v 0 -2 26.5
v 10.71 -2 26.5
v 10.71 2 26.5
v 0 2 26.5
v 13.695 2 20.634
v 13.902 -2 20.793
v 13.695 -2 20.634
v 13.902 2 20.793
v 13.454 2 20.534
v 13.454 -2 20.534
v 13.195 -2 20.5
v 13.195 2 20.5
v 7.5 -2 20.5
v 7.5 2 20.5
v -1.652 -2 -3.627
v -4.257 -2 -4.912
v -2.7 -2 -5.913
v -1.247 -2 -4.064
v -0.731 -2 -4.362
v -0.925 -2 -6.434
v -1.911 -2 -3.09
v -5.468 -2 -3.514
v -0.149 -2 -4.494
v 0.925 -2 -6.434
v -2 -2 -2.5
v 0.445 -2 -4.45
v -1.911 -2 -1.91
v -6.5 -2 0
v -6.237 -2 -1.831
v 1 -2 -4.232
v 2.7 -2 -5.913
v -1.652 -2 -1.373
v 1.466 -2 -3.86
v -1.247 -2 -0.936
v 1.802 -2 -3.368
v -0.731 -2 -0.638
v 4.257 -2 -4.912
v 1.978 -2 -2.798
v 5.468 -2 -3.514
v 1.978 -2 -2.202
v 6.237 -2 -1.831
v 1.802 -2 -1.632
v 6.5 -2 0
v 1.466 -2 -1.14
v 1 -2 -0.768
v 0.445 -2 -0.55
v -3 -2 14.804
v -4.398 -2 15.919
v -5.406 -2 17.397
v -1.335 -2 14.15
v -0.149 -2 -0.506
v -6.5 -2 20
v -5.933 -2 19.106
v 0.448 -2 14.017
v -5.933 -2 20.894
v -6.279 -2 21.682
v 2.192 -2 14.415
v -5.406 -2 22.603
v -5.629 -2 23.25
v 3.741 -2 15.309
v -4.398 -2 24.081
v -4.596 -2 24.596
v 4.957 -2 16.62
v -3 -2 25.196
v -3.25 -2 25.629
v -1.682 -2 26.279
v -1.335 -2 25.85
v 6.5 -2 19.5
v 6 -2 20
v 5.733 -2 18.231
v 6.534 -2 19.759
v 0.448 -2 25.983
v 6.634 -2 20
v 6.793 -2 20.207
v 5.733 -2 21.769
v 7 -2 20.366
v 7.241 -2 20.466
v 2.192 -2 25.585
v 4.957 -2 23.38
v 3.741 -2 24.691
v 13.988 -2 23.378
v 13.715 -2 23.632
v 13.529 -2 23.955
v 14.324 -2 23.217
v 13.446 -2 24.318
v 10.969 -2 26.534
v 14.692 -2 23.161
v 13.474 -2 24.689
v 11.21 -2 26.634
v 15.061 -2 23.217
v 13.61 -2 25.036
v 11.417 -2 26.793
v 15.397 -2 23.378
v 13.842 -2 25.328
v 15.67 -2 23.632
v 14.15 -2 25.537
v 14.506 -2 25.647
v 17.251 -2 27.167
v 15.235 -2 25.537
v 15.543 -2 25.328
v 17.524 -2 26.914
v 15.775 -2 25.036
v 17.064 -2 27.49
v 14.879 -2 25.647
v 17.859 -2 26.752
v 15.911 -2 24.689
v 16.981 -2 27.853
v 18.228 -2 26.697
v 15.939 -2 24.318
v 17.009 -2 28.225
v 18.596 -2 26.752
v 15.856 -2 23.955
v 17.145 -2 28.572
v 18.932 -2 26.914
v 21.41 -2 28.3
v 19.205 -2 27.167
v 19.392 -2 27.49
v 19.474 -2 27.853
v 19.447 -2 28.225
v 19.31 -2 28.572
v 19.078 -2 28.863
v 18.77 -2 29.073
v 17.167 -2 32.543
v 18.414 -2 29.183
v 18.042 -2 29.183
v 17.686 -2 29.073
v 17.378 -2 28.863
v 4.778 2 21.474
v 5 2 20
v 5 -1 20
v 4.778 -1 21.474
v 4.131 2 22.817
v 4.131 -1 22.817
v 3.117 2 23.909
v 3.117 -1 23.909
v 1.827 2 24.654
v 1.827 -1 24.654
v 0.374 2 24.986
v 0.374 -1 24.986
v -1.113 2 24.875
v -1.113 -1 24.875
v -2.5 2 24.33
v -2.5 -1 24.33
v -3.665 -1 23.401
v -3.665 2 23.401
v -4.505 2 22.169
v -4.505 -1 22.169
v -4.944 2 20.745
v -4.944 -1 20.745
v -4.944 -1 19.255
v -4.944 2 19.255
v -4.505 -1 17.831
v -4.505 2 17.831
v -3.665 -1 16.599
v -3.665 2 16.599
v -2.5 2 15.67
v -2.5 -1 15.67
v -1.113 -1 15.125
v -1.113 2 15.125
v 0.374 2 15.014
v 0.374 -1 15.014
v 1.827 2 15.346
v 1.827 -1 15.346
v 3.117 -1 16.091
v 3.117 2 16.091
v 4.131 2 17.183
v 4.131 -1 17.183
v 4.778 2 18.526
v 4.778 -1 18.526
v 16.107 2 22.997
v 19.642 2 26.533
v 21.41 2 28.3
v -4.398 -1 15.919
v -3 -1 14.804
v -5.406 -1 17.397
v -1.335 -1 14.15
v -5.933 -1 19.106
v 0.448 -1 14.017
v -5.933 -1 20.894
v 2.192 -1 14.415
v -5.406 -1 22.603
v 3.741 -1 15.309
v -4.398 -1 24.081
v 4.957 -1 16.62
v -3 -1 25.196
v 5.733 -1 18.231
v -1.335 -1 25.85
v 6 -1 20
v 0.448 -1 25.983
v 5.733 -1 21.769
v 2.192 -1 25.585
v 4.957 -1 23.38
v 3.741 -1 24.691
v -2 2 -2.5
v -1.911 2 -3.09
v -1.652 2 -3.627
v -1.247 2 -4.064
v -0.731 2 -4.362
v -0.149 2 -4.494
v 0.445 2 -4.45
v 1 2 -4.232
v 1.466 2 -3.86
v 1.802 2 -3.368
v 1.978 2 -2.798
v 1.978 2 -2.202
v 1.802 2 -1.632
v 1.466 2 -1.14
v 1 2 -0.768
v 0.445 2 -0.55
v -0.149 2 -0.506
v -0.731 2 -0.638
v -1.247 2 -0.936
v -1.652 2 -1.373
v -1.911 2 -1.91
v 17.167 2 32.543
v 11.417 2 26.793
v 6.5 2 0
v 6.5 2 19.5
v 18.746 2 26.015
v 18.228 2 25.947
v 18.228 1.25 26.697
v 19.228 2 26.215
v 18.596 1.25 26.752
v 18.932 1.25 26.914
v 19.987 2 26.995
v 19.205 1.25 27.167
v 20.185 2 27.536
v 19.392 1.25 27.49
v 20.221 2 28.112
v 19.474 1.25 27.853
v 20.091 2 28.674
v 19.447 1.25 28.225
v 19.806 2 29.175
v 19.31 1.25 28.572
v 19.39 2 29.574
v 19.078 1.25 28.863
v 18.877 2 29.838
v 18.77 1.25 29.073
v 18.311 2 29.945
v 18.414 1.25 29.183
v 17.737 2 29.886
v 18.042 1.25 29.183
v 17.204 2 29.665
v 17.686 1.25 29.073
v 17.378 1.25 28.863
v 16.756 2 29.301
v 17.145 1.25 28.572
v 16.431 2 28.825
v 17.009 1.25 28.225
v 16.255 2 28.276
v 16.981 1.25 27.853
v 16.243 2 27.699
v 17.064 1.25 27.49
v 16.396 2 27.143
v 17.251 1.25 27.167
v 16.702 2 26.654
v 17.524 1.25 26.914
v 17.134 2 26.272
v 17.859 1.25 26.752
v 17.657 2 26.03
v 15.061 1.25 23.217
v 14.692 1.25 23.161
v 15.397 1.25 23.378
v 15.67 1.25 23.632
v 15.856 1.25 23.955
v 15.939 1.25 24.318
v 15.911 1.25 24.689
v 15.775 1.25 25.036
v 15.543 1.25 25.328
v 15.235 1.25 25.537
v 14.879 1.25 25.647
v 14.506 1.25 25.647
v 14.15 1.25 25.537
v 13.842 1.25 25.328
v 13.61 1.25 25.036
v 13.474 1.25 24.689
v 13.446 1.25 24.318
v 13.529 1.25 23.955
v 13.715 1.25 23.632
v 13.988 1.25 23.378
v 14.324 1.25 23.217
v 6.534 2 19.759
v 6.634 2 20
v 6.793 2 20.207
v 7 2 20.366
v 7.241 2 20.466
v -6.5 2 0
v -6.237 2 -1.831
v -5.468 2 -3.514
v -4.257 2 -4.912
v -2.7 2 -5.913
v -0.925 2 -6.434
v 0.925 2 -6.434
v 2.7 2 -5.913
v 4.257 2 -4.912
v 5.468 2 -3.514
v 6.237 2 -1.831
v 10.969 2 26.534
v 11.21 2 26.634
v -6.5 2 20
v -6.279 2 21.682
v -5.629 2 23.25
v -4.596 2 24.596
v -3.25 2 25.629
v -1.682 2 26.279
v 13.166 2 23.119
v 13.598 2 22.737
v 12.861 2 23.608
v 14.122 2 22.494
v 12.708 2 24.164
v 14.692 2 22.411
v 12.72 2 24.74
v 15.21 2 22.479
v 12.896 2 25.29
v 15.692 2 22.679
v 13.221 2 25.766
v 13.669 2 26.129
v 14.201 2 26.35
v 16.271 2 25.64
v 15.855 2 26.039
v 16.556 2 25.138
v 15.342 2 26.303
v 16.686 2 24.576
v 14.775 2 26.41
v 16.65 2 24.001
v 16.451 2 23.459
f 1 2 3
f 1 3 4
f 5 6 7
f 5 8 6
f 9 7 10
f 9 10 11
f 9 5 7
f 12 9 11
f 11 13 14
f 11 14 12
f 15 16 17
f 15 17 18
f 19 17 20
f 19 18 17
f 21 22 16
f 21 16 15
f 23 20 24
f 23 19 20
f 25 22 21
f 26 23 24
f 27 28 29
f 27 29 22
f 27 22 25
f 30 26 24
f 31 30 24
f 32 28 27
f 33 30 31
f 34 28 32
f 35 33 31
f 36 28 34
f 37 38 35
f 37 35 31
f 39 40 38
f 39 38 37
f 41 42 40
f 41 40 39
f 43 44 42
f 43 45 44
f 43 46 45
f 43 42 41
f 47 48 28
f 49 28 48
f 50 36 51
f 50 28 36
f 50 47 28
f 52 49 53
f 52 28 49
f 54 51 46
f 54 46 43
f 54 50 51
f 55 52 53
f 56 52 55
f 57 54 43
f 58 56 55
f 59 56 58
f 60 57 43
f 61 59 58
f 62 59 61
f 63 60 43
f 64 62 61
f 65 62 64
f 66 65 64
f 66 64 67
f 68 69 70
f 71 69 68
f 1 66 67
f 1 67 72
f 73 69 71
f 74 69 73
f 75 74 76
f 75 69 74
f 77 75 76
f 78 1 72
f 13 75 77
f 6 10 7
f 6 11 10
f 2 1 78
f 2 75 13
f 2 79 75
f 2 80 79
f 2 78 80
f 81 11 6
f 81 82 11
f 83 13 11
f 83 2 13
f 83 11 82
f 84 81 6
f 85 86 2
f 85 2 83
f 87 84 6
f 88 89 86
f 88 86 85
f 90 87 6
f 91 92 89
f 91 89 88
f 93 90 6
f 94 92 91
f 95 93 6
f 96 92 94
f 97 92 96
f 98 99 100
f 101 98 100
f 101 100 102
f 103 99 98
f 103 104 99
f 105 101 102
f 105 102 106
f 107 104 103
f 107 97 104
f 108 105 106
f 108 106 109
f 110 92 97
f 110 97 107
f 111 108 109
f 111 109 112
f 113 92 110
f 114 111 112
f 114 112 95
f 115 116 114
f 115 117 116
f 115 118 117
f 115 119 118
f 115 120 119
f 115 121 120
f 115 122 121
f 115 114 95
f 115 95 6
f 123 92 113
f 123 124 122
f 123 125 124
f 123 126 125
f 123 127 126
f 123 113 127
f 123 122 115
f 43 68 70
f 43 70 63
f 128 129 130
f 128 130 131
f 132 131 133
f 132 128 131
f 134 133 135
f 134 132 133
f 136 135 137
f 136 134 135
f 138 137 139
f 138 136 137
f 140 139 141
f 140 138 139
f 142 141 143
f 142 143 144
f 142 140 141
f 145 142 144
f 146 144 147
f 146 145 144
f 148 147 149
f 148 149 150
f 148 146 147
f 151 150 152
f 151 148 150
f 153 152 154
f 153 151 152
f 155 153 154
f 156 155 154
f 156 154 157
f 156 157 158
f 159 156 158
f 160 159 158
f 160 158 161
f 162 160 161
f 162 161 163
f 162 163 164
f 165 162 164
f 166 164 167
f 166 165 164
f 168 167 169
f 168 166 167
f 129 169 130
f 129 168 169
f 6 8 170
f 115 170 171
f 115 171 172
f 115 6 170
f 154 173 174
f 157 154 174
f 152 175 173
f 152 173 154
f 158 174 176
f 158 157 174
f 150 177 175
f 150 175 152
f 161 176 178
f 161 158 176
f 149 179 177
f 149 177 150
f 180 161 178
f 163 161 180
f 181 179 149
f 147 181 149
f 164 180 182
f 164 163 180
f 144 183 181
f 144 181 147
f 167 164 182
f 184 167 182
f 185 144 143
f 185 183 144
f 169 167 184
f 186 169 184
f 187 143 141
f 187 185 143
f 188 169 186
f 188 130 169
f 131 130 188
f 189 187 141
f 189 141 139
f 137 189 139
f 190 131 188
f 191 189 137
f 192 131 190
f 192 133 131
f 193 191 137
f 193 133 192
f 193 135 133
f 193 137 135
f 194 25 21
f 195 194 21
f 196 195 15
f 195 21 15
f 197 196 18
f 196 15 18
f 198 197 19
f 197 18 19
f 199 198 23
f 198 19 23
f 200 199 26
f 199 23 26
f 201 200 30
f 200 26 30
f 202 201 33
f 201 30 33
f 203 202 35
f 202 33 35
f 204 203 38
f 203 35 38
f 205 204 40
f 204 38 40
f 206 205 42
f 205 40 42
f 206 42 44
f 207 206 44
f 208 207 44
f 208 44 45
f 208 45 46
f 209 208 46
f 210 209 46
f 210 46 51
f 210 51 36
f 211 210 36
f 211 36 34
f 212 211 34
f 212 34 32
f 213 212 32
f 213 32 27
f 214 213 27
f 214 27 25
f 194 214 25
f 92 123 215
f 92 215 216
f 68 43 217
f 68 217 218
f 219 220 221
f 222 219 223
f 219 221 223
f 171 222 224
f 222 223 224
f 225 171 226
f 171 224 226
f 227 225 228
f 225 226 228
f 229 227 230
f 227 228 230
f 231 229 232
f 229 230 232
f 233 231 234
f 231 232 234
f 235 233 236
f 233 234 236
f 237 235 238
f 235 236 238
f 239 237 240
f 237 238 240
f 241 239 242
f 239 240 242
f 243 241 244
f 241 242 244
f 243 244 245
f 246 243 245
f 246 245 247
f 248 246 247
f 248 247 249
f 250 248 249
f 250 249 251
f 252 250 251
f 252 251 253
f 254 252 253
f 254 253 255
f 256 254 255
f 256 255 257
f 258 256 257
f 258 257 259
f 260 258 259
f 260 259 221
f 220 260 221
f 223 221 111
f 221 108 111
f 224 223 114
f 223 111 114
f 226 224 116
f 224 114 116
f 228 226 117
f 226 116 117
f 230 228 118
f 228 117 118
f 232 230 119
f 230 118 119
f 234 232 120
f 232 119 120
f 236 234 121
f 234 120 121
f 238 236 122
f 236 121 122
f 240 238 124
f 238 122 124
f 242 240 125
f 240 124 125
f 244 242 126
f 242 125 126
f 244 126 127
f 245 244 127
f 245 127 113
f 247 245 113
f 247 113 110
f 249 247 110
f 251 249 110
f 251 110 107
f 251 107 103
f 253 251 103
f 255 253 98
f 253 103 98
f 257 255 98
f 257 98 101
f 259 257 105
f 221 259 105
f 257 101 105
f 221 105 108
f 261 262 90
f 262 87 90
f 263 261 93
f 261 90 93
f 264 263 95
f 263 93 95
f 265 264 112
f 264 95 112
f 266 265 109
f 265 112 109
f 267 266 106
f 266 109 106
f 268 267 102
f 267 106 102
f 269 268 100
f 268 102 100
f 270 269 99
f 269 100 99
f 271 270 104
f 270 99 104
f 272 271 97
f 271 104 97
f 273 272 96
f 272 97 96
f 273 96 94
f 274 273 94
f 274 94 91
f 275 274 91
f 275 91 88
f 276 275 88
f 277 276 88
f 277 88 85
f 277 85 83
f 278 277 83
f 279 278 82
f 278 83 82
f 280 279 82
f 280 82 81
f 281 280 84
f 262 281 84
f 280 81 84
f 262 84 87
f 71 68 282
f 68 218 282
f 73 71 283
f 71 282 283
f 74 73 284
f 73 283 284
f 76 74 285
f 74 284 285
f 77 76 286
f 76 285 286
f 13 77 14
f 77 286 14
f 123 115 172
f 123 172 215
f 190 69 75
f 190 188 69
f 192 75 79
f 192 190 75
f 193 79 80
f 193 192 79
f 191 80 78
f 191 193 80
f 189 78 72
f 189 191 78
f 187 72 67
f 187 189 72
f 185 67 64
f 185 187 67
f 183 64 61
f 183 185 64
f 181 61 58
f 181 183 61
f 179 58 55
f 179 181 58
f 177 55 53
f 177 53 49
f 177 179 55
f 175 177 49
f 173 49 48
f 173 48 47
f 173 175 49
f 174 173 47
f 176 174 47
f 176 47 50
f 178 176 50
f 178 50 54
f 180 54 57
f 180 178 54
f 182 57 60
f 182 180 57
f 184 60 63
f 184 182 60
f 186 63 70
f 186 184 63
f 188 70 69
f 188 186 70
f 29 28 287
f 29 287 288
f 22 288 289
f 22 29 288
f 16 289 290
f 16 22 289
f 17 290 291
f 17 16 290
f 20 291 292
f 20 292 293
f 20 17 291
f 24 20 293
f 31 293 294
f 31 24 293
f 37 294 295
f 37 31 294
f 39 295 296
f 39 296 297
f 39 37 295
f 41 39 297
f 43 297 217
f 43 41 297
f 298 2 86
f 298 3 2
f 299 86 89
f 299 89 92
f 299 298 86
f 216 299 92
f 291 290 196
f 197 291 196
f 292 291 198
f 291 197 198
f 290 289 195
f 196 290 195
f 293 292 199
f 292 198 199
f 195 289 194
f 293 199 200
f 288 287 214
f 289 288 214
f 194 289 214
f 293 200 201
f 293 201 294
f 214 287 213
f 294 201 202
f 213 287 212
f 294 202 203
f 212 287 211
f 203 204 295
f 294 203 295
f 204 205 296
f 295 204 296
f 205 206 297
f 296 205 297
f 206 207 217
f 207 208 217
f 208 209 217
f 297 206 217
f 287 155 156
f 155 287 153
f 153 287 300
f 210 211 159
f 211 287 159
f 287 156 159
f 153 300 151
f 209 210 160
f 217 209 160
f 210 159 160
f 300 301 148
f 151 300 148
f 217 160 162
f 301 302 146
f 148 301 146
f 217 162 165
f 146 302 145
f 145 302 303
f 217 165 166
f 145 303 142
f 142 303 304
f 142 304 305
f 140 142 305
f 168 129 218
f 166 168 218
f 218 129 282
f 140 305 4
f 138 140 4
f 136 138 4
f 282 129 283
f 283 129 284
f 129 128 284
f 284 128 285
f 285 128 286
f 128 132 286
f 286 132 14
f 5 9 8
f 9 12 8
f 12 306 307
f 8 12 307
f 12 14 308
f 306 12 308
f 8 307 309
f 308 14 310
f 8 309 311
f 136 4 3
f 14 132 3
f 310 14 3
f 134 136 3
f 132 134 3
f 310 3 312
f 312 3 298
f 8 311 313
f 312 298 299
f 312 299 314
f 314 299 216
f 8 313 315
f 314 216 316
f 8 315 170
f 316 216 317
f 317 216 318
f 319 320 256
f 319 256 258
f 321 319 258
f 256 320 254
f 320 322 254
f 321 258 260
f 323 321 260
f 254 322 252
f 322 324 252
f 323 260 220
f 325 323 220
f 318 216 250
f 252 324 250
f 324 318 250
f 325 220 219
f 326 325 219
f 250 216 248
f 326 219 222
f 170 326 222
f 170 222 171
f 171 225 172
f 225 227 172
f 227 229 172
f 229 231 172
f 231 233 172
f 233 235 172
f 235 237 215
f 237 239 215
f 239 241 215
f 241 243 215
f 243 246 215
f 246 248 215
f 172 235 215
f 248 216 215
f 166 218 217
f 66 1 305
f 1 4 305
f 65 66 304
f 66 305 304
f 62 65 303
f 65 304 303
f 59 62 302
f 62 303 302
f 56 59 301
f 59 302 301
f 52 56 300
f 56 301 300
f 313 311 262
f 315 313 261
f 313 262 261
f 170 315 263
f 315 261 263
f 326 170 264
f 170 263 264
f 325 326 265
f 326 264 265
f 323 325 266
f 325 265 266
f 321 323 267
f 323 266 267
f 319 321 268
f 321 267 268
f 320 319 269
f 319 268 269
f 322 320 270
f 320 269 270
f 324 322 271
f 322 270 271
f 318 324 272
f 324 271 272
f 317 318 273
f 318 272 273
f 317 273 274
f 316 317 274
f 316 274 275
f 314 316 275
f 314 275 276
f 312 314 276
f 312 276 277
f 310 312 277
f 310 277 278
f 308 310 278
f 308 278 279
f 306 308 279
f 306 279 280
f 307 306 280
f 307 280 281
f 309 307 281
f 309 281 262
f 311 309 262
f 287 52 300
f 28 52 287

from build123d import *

# Parameters (mm, degrees)
BOSS_EXTRUDE1_DEPTH           = 4
DRAFT1_ANGLE                  = 45.000000004
DRAFT2_ANGLE                  = 45.000000005
F_4_0_4_DIAMETER_HOLE1_D      = 4
FILLET1_R                     = 1
FILLET2_R                     = 6.5
CSK_FOR_M3_SFHCS2_D           = 2.5
CSK_FOR_M3_SFHCS2_CSINK_D     = 4
CSK_FOR_M3_SFHCS2_CSINK_ANGLE = 90


with BuildPart() as part:
    # Sketch1 → Boss-Extrude1 (new body)
    with BuildSketch(Plane.XZ.offset(2)):
        with BuildLine():
            Line((11.124319466, 26.5), (-6.5, 26.5))
            Line((-6.5, 26.5), (-6.5, 0))
            ThreePointArc((-6.5, 0), (3e-09, -6.500000003), (6.500000005, 0))
            Line((6.500000005, 0), (6.500000005, 20.5))
            Line((6.500000005, 20.5), (13.60960084, 20.5))
            Line((13.60960084, 20.5), (13.60960084, 36.100603473))
            Line((13.60960084, 36.100603473), (11.124319466, 38.585884847))
            Line((11.124319466, 38.585884847), (11.124319466, 26.5))
        make_face()
    extrude(amount=-BOSS_EXTRUDE1_DEPTH)

    # Draft1
    draft1_faces = [part.faces().sort_by_distance(p)[0] for p in [
        (13.60960084, 0, 28.300301737),
    ]]
    draft(draft1_faces, Plane(origin=(6.500000005, 2, 20.5), x_dir=(-1, 0, 0), z_dir=(0, 0, -1)), DRAFT1_ANGLE)

    # Draft2
    draft2_faces = [part.faces().sort_by_distance(p)[0] for p in [
        (11.124319466, 0, 32.542942424),
    ]]
    draft(draft2_faces, Plane(origin=(11.124319466, 2, 26.5), x_dir=(1, 0, 0), z_dir=(0, 0, 1)), DRAFT2_ANGLE)

    # Sketch2 → Cut-Revolve1 (revolve, cut)
    with BuildSketch(Plane.XY.offset(20)):
        Polygon((0, 3.195464025), (0, -2), (6, -2), (6, -1), (5, -1), (5, 3.195464025), align=None)
    revolve(axis=Axis((0, 3.195464025, 20), (0, -1, 0)), mode=Mode.SUBTRACT)

    # Ø4.0 (4) Diameter Hole1 (through all)
    with Locations(Plane(origin=(0, 2, 0), x_dir=(1, 0, 0), z_dir=(0, 1, 0))):
        with Locations((0, 2.5)):
            Hole(F_4_0_4_DIAMETER_HOLE1_D / 2)

    # Fillet1
    fillet1_edges = [part.edges().sort_by_distance(p)[0] for p in [
        (13.60960084, 0, 20.5),
        (6.500000005, 0, 20.5),
        (11.124319466, 0, 26.5),
    ]]
    fillet(fillet1_edges, radius=FILLET1_R)

    # Fillet2
    fillet2_edges = [part.edges().sort_by_distance(p)[0] for p in [
        (-6.5, 0, 26.5),
    ]]
    fillet(fillet2_edges, radius=FILLET2_R)

    # CSK for M3 SFHCS2 (through all)
    with Locations(Plane(origin=(18.227922062, 2, 27.946748346), x_dir=(0, 0, 1), z_dir=(0, 1, 0))):
        with Locations((0, 0), (-3.535533906, -3.535533907)):
            CounterSinkHole(CSK_FOR_M3_SFHCS2_D / 2, CSK_FOR_M3_SFHCS2_CSINK_D / 2, counter_sink_angle=CSK_FOR_M3_SFHCS2_CSINK_ANGLE)


solid = part.part
